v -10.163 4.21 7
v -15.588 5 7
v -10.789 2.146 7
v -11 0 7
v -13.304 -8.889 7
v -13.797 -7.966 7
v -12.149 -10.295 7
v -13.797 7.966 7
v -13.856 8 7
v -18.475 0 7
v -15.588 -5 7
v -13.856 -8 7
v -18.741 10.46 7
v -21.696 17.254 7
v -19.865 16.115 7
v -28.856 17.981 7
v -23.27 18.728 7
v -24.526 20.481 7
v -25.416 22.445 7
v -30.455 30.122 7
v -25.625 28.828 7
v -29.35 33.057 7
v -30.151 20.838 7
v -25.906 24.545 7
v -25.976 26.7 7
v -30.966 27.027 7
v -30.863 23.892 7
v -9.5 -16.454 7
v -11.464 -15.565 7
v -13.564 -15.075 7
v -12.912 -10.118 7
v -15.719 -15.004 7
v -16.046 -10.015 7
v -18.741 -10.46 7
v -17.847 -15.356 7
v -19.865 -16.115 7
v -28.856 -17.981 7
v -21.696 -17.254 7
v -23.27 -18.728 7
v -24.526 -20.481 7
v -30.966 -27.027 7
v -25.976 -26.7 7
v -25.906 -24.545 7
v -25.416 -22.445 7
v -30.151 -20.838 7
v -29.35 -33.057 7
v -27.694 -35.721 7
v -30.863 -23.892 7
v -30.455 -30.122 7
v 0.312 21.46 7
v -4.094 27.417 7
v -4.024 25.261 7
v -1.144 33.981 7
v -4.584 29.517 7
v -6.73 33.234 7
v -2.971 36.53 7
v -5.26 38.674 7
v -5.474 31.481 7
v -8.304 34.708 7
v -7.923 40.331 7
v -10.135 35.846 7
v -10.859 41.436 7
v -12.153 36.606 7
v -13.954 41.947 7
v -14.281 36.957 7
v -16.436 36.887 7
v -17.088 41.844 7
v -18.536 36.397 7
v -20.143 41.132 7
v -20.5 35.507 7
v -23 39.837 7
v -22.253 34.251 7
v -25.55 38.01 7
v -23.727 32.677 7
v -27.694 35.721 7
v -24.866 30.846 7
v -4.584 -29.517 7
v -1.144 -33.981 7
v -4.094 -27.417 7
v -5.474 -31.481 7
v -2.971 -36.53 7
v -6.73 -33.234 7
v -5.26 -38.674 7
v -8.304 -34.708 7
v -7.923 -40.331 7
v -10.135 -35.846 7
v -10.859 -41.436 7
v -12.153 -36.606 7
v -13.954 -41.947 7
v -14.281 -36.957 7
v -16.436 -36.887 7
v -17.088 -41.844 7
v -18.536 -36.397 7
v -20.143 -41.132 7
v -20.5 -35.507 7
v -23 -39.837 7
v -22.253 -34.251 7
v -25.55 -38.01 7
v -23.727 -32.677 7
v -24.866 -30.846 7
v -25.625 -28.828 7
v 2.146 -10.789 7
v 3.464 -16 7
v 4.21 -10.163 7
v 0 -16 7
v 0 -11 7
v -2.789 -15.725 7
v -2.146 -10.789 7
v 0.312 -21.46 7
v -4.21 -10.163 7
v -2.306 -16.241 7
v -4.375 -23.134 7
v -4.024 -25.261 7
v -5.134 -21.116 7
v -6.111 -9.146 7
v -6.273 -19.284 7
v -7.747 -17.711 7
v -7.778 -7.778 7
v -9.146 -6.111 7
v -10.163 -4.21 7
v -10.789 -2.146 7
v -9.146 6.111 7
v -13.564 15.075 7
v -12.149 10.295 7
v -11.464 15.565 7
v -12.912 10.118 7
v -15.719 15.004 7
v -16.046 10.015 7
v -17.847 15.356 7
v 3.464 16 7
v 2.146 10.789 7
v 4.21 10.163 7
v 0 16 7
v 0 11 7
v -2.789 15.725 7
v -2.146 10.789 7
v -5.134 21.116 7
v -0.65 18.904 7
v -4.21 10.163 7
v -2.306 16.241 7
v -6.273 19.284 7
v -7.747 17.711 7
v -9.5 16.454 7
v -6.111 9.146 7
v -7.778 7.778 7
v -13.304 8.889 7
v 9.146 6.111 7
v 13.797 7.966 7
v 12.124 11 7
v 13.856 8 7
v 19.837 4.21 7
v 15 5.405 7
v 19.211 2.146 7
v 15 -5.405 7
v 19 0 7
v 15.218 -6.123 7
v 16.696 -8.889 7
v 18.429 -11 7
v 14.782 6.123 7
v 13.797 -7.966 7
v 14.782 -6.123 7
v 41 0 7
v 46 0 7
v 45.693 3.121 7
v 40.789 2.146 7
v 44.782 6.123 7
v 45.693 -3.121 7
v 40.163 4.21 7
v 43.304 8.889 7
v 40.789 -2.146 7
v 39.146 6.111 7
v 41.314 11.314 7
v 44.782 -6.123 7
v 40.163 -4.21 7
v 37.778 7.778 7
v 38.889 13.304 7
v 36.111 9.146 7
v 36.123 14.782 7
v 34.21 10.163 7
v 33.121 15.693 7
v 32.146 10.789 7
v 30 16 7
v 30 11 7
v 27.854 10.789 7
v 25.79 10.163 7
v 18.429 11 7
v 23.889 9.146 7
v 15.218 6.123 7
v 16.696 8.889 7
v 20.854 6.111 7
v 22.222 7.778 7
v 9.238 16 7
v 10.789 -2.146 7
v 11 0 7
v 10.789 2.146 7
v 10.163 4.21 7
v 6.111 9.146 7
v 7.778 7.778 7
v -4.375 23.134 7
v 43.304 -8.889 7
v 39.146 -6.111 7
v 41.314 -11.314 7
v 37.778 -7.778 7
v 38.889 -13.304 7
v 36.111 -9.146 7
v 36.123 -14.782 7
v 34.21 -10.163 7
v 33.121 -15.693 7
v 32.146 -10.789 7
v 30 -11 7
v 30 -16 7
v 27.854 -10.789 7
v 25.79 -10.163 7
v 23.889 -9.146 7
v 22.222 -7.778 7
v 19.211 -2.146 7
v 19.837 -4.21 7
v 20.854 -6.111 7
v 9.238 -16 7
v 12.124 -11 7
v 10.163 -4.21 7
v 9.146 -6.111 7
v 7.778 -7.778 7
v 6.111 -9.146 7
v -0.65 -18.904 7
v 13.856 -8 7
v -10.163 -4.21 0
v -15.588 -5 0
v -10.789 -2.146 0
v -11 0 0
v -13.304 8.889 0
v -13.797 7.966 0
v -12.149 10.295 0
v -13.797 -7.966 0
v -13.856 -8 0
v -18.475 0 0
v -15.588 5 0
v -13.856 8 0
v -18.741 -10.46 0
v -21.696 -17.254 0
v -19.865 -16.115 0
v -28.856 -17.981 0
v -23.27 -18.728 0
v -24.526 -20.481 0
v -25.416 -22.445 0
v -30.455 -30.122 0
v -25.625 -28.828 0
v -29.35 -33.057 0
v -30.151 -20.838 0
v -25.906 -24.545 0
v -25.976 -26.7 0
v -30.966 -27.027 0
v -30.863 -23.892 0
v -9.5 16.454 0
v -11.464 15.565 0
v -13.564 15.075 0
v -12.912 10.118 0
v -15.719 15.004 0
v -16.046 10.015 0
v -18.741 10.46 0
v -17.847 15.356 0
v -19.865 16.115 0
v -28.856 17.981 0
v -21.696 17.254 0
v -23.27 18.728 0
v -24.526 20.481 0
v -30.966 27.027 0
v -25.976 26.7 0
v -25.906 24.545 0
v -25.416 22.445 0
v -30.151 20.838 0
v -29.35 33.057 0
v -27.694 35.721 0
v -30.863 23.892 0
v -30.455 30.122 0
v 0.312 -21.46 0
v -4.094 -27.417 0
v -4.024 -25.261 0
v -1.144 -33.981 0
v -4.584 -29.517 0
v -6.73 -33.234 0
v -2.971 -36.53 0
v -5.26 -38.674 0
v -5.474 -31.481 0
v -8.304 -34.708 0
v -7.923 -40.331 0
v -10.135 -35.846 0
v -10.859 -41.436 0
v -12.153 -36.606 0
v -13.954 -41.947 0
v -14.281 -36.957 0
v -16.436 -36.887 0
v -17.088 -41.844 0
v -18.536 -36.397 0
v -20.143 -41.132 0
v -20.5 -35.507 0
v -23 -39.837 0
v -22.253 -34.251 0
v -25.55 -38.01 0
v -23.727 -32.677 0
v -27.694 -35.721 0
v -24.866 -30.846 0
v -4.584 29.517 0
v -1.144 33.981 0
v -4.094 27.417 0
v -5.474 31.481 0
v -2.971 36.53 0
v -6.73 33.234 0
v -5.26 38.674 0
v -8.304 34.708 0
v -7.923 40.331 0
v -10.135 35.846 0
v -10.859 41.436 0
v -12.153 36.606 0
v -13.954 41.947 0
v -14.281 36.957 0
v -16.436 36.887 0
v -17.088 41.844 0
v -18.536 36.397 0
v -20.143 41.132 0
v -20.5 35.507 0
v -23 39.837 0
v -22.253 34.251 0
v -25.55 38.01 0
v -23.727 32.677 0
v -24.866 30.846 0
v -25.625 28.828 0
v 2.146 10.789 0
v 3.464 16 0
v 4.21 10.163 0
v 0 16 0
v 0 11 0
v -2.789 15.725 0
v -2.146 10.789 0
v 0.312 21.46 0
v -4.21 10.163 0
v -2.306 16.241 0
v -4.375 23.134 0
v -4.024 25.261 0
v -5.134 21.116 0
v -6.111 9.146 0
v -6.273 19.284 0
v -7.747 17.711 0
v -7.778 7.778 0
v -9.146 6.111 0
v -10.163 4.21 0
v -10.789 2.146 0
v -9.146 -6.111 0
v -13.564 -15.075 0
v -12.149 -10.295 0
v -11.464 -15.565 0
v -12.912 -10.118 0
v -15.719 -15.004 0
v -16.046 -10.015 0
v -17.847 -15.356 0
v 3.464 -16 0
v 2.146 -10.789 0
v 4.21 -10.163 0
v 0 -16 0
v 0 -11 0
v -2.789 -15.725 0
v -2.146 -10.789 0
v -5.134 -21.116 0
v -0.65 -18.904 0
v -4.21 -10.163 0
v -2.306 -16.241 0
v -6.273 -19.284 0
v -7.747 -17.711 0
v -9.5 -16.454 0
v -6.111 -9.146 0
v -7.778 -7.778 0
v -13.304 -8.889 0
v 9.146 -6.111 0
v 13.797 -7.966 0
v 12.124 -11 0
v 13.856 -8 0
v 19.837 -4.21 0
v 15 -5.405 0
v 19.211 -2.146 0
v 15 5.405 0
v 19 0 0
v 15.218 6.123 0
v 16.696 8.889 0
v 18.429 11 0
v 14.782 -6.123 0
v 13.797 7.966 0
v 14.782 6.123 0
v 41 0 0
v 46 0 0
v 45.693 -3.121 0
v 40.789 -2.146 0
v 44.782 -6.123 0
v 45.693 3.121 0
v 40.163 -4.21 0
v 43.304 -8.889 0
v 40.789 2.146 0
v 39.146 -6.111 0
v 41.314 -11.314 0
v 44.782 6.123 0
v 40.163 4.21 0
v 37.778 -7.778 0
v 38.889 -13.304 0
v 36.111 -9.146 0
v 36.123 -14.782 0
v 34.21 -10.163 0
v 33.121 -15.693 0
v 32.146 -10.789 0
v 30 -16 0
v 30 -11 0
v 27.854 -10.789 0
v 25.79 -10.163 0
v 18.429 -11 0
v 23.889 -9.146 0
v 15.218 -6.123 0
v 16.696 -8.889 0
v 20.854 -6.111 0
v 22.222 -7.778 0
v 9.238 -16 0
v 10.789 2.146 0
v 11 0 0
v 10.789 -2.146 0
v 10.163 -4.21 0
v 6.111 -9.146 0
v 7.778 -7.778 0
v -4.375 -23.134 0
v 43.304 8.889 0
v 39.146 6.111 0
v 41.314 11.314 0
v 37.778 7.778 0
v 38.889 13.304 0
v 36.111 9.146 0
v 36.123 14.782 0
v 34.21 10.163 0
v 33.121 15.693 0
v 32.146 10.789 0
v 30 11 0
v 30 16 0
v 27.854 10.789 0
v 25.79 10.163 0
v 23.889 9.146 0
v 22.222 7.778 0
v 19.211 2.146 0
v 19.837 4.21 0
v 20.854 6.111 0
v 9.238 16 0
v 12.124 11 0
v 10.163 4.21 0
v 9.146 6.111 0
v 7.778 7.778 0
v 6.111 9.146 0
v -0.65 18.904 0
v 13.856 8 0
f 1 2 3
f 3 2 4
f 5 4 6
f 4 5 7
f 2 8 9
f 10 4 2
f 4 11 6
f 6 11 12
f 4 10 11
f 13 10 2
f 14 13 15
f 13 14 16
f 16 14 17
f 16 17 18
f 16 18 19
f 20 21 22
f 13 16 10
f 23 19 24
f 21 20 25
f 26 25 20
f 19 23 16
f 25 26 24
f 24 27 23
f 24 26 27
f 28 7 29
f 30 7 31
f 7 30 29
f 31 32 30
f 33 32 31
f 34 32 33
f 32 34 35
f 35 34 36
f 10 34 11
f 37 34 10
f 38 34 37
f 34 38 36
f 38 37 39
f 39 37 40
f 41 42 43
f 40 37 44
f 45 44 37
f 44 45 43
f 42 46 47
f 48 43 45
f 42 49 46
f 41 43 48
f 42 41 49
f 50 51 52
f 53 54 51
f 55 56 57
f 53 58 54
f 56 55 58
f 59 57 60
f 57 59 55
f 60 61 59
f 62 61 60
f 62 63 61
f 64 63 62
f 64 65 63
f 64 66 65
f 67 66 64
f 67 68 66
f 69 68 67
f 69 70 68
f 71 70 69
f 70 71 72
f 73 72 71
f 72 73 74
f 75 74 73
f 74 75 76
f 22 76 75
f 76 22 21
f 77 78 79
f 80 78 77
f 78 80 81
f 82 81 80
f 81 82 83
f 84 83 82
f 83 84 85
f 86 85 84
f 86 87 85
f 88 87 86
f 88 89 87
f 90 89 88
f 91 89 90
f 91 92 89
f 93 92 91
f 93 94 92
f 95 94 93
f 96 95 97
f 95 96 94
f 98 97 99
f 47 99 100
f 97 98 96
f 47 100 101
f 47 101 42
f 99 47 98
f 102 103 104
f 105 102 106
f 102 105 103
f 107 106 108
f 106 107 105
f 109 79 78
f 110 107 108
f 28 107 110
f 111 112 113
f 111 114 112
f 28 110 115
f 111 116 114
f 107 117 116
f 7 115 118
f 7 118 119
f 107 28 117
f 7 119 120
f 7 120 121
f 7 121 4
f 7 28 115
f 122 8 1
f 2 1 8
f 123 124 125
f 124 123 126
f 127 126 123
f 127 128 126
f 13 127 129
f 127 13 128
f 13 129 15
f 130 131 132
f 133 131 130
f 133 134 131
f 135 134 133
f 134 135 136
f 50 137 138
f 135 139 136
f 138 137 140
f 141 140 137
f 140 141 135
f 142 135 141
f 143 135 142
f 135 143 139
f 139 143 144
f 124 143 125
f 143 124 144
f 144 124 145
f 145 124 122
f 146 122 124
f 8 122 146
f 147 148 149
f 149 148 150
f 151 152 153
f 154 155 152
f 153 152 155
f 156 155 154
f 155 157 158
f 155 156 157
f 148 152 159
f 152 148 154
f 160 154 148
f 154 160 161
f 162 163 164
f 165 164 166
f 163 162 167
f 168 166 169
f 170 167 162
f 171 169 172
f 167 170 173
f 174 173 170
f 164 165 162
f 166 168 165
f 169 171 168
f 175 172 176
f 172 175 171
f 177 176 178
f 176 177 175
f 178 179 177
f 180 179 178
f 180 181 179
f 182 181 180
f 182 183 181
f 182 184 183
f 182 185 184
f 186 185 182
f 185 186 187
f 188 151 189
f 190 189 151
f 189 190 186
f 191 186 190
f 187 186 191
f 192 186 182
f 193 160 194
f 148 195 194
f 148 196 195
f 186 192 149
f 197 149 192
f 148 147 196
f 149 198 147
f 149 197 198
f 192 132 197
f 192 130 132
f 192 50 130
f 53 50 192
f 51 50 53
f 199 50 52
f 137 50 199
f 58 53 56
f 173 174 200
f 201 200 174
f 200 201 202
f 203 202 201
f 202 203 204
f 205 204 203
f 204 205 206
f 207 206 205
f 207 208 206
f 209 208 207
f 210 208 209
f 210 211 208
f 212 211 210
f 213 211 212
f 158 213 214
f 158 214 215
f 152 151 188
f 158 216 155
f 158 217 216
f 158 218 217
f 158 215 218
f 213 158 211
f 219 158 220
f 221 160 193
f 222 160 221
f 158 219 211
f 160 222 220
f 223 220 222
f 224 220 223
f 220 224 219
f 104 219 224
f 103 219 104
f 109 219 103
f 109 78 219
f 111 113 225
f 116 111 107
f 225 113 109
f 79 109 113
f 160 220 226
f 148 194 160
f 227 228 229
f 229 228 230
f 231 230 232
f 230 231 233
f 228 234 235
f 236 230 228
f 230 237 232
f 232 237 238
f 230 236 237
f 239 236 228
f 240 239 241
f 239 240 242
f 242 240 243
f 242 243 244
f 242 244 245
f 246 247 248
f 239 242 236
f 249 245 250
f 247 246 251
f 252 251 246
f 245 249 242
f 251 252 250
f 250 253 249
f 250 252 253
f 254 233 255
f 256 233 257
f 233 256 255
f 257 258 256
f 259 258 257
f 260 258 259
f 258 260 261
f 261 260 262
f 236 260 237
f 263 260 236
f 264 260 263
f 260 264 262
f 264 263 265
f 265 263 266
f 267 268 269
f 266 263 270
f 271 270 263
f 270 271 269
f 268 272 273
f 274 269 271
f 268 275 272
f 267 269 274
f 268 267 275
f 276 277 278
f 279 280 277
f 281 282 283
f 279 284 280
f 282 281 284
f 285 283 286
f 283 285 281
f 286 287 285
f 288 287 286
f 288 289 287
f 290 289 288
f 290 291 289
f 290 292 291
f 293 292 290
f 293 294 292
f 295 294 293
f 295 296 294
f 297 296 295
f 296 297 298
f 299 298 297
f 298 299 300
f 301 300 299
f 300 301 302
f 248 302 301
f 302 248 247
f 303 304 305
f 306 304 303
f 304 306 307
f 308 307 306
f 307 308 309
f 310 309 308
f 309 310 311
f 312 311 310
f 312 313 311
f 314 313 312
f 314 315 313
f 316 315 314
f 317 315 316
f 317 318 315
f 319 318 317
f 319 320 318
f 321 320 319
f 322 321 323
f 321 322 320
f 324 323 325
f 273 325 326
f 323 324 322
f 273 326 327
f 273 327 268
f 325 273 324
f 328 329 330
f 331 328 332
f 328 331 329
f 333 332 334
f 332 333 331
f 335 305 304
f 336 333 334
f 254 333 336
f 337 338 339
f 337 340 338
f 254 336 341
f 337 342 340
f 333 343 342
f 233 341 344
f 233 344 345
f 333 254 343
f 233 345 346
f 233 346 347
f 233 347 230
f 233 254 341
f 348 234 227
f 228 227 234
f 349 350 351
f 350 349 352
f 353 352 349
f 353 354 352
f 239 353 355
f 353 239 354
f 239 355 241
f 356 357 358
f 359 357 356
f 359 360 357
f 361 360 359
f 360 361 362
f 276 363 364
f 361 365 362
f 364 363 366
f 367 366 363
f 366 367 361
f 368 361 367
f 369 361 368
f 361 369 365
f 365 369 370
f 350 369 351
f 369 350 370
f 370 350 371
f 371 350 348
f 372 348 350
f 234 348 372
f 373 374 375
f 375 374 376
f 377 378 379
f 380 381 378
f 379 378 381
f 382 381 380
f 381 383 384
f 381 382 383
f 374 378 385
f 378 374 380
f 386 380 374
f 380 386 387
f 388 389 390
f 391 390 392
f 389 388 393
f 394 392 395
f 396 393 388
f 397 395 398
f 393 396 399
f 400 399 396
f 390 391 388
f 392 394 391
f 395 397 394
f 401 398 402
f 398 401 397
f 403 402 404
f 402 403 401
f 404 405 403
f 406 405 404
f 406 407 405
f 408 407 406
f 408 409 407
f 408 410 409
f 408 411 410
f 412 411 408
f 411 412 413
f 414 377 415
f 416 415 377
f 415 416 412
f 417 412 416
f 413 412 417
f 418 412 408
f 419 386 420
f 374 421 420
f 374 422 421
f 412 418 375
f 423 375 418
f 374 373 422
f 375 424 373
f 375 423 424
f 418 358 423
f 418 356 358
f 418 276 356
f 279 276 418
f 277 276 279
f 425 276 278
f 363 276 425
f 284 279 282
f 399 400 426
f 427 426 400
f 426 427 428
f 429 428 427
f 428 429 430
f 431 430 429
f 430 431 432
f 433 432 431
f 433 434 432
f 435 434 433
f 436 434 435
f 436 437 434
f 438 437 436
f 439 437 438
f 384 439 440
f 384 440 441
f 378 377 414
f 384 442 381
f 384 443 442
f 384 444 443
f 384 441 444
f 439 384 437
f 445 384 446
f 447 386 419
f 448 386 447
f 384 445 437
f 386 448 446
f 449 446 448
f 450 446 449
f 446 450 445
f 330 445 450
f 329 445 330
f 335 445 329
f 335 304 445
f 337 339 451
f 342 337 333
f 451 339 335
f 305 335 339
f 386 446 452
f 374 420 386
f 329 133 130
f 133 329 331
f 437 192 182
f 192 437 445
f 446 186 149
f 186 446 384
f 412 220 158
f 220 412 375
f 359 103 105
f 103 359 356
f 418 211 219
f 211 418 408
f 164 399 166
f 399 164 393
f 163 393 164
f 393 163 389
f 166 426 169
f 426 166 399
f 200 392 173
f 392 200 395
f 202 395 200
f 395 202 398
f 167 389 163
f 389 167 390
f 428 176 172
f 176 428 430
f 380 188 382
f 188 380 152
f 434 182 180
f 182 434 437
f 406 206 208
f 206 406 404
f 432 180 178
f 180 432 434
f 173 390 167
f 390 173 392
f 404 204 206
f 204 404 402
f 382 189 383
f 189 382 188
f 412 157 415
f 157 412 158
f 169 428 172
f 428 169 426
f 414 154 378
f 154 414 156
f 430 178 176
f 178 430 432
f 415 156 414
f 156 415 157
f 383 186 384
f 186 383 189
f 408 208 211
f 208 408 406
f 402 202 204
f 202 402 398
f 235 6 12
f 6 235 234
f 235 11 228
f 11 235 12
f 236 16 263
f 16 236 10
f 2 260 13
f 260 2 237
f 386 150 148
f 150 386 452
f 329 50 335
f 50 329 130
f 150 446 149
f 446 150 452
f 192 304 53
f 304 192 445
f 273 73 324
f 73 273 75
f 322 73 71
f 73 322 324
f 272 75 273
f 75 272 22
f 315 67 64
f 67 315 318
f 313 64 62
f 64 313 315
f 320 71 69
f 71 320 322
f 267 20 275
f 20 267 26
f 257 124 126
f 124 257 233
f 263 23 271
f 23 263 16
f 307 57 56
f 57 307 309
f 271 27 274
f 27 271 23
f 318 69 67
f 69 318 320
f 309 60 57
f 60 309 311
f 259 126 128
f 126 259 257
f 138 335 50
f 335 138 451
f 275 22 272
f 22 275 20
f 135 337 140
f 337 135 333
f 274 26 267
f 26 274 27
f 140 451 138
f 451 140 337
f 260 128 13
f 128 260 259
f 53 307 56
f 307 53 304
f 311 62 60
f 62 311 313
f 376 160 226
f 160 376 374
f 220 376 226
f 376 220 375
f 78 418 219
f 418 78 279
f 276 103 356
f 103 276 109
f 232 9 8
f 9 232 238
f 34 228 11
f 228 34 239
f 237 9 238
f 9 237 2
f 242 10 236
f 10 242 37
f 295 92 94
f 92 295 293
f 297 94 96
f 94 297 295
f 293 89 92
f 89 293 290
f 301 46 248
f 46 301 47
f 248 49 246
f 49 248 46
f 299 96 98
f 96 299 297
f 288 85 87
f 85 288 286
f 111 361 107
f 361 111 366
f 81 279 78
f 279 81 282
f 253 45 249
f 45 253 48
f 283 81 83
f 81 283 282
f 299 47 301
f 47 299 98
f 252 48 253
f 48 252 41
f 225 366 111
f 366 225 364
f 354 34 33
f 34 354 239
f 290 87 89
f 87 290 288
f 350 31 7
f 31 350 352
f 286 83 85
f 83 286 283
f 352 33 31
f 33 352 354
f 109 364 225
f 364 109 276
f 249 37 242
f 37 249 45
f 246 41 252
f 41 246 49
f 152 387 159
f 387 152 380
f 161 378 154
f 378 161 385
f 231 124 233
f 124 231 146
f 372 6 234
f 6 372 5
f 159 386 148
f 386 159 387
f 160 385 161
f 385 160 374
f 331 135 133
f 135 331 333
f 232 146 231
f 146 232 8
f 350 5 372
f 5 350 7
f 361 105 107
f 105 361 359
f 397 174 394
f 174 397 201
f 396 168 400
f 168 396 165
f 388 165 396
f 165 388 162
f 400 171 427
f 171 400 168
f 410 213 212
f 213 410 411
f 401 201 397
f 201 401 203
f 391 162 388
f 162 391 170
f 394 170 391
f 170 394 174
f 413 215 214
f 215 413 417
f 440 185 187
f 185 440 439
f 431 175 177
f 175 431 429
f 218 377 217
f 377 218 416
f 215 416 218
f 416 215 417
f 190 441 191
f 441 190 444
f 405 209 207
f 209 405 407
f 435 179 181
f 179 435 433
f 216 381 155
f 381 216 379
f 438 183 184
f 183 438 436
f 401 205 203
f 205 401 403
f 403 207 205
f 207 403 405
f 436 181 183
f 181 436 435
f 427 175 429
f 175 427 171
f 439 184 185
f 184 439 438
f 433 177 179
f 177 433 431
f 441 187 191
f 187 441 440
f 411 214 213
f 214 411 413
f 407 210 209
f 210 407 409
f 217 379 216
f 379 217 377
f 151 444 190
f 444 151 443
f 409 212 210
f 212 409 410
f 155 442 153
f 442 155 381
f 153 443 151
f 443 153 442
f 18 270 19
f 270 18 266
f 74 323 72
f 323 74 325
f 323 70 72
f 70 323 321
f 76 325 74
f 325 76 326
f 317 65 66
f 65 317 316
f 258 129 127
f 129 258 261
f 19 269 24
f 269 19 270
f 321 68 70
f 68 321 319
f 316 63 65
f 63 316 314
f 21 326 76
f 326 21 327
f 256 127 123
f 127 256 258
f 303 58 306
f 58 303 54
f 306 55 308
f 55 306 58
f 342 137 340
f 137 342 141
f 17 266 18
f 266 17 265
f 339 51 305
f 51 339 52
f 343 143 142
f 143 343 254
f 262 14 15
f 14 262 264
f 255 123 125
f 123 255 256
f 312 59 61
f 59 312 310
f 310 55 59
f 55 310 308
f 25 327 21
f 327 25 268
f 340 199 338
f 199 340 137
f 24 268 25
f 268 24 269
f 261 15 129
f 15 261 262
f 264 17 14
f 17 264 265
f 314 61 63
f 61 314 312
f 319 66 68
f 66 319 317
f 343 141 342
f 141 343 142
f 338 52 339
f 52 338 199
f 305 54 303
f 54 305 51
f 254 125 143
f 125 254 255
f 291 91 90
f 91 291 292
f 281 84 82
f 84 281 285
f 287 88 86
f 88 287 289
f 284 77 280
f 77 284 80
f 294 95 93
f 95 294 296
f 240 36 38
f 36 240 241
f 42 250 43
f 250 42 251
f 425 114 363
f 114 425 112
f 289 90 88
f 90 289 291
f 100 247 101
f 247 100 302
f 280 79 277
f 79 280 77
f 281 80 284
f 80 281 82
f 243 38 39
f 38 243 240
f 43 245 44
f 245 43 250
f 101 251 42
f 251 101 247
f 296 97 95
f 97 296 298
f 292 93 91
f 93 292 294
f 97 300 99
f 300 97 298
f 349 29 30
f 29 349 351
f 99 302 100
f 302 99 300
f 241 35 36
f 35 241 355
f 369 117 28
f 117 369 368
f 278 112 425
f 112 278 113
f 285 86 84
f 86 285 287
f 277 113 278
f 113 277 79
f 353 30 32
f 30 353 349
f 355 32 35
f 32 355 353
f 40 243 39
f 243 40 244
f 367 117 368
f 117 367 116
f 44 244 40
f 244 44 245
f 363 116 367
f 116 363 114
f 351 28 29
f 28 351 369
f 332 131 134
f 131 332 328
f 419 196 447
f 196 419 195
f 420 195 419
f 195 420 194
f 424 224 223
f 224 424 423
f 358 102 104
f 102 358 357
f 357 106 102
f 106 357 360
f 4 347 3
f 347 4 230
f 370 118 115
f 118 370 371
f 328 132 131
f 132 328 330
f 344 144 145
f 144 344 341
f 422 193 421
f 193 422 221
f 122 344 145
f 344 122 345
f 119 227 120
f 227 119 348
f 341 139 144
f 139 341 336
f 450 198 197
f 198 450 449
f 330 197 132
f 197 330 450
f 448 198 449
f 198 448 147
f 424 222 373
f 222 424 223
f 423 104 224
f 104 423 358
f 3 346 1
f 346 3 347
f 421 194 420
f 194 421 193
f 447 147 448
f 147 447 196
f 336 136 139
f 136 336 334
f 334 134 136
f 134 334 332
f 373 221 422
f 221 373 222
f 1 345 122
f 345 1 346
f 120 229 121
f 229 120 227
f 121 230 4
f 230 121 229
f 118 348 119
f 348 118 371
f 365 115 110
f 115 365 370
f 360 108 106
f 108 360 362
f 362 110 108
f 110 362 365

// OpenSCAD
bearing_diam = 22;
bearing_height = 7;
nb_branches = 3;
dist_between_bearings = 30;
border_width = 5;

$fn=32;

module bearing(x=0, y=0, z=0, height=bearing_height)
{
  translate([x, y, z]) cylinder(h=height, d=bearing_diam);
}

module place_bearings(height=bearing_height)
{
  angle = 360/nb_branches;
  bearing(height=height);
  for(i=[0:nb_branches])
  {
    rotate(a=angle*i) bearing(x=dist_between_bearings, height=height);
  }
}

module outer_shell_one_bearing()
{
  cylinder(d=bearing_diam+border_width*2, h=bearing_height);
}

module junction_bars_one_bearing()
{
  bar_len = dist_between_bearings;
  bar_offset = bearing_diam/2;
  union()
  {
    translate([bar_len/2,bar_offset+border_width/2, bearing_height/2]) cube(size=[bar_len,border_width,bearing_height], center=true);
    translate([bar_len/2,-(bar_offset+border_width/2), bearing_height/2]) cube(size=[bar_len,border_width,bearing_height], center=true);
  }
}

module outer_shell()
{
  angle = 360/nb_branches;
  union()
  {
    outer_shell_one_bearing(); // center bearing
    for(i=[0:nb_branches])
    {
      rotate(a=angle*i) union()
      {
        translate([dist_between_bearings,0,0]) outer_shell_one_bearing();
        junction_bars_one_bearing();
      }
    }
  }
}

difference()
{
  outer_shell();
  translate([0, 0, -0.5]) place_bearings(height=bearing_height+1);
}
